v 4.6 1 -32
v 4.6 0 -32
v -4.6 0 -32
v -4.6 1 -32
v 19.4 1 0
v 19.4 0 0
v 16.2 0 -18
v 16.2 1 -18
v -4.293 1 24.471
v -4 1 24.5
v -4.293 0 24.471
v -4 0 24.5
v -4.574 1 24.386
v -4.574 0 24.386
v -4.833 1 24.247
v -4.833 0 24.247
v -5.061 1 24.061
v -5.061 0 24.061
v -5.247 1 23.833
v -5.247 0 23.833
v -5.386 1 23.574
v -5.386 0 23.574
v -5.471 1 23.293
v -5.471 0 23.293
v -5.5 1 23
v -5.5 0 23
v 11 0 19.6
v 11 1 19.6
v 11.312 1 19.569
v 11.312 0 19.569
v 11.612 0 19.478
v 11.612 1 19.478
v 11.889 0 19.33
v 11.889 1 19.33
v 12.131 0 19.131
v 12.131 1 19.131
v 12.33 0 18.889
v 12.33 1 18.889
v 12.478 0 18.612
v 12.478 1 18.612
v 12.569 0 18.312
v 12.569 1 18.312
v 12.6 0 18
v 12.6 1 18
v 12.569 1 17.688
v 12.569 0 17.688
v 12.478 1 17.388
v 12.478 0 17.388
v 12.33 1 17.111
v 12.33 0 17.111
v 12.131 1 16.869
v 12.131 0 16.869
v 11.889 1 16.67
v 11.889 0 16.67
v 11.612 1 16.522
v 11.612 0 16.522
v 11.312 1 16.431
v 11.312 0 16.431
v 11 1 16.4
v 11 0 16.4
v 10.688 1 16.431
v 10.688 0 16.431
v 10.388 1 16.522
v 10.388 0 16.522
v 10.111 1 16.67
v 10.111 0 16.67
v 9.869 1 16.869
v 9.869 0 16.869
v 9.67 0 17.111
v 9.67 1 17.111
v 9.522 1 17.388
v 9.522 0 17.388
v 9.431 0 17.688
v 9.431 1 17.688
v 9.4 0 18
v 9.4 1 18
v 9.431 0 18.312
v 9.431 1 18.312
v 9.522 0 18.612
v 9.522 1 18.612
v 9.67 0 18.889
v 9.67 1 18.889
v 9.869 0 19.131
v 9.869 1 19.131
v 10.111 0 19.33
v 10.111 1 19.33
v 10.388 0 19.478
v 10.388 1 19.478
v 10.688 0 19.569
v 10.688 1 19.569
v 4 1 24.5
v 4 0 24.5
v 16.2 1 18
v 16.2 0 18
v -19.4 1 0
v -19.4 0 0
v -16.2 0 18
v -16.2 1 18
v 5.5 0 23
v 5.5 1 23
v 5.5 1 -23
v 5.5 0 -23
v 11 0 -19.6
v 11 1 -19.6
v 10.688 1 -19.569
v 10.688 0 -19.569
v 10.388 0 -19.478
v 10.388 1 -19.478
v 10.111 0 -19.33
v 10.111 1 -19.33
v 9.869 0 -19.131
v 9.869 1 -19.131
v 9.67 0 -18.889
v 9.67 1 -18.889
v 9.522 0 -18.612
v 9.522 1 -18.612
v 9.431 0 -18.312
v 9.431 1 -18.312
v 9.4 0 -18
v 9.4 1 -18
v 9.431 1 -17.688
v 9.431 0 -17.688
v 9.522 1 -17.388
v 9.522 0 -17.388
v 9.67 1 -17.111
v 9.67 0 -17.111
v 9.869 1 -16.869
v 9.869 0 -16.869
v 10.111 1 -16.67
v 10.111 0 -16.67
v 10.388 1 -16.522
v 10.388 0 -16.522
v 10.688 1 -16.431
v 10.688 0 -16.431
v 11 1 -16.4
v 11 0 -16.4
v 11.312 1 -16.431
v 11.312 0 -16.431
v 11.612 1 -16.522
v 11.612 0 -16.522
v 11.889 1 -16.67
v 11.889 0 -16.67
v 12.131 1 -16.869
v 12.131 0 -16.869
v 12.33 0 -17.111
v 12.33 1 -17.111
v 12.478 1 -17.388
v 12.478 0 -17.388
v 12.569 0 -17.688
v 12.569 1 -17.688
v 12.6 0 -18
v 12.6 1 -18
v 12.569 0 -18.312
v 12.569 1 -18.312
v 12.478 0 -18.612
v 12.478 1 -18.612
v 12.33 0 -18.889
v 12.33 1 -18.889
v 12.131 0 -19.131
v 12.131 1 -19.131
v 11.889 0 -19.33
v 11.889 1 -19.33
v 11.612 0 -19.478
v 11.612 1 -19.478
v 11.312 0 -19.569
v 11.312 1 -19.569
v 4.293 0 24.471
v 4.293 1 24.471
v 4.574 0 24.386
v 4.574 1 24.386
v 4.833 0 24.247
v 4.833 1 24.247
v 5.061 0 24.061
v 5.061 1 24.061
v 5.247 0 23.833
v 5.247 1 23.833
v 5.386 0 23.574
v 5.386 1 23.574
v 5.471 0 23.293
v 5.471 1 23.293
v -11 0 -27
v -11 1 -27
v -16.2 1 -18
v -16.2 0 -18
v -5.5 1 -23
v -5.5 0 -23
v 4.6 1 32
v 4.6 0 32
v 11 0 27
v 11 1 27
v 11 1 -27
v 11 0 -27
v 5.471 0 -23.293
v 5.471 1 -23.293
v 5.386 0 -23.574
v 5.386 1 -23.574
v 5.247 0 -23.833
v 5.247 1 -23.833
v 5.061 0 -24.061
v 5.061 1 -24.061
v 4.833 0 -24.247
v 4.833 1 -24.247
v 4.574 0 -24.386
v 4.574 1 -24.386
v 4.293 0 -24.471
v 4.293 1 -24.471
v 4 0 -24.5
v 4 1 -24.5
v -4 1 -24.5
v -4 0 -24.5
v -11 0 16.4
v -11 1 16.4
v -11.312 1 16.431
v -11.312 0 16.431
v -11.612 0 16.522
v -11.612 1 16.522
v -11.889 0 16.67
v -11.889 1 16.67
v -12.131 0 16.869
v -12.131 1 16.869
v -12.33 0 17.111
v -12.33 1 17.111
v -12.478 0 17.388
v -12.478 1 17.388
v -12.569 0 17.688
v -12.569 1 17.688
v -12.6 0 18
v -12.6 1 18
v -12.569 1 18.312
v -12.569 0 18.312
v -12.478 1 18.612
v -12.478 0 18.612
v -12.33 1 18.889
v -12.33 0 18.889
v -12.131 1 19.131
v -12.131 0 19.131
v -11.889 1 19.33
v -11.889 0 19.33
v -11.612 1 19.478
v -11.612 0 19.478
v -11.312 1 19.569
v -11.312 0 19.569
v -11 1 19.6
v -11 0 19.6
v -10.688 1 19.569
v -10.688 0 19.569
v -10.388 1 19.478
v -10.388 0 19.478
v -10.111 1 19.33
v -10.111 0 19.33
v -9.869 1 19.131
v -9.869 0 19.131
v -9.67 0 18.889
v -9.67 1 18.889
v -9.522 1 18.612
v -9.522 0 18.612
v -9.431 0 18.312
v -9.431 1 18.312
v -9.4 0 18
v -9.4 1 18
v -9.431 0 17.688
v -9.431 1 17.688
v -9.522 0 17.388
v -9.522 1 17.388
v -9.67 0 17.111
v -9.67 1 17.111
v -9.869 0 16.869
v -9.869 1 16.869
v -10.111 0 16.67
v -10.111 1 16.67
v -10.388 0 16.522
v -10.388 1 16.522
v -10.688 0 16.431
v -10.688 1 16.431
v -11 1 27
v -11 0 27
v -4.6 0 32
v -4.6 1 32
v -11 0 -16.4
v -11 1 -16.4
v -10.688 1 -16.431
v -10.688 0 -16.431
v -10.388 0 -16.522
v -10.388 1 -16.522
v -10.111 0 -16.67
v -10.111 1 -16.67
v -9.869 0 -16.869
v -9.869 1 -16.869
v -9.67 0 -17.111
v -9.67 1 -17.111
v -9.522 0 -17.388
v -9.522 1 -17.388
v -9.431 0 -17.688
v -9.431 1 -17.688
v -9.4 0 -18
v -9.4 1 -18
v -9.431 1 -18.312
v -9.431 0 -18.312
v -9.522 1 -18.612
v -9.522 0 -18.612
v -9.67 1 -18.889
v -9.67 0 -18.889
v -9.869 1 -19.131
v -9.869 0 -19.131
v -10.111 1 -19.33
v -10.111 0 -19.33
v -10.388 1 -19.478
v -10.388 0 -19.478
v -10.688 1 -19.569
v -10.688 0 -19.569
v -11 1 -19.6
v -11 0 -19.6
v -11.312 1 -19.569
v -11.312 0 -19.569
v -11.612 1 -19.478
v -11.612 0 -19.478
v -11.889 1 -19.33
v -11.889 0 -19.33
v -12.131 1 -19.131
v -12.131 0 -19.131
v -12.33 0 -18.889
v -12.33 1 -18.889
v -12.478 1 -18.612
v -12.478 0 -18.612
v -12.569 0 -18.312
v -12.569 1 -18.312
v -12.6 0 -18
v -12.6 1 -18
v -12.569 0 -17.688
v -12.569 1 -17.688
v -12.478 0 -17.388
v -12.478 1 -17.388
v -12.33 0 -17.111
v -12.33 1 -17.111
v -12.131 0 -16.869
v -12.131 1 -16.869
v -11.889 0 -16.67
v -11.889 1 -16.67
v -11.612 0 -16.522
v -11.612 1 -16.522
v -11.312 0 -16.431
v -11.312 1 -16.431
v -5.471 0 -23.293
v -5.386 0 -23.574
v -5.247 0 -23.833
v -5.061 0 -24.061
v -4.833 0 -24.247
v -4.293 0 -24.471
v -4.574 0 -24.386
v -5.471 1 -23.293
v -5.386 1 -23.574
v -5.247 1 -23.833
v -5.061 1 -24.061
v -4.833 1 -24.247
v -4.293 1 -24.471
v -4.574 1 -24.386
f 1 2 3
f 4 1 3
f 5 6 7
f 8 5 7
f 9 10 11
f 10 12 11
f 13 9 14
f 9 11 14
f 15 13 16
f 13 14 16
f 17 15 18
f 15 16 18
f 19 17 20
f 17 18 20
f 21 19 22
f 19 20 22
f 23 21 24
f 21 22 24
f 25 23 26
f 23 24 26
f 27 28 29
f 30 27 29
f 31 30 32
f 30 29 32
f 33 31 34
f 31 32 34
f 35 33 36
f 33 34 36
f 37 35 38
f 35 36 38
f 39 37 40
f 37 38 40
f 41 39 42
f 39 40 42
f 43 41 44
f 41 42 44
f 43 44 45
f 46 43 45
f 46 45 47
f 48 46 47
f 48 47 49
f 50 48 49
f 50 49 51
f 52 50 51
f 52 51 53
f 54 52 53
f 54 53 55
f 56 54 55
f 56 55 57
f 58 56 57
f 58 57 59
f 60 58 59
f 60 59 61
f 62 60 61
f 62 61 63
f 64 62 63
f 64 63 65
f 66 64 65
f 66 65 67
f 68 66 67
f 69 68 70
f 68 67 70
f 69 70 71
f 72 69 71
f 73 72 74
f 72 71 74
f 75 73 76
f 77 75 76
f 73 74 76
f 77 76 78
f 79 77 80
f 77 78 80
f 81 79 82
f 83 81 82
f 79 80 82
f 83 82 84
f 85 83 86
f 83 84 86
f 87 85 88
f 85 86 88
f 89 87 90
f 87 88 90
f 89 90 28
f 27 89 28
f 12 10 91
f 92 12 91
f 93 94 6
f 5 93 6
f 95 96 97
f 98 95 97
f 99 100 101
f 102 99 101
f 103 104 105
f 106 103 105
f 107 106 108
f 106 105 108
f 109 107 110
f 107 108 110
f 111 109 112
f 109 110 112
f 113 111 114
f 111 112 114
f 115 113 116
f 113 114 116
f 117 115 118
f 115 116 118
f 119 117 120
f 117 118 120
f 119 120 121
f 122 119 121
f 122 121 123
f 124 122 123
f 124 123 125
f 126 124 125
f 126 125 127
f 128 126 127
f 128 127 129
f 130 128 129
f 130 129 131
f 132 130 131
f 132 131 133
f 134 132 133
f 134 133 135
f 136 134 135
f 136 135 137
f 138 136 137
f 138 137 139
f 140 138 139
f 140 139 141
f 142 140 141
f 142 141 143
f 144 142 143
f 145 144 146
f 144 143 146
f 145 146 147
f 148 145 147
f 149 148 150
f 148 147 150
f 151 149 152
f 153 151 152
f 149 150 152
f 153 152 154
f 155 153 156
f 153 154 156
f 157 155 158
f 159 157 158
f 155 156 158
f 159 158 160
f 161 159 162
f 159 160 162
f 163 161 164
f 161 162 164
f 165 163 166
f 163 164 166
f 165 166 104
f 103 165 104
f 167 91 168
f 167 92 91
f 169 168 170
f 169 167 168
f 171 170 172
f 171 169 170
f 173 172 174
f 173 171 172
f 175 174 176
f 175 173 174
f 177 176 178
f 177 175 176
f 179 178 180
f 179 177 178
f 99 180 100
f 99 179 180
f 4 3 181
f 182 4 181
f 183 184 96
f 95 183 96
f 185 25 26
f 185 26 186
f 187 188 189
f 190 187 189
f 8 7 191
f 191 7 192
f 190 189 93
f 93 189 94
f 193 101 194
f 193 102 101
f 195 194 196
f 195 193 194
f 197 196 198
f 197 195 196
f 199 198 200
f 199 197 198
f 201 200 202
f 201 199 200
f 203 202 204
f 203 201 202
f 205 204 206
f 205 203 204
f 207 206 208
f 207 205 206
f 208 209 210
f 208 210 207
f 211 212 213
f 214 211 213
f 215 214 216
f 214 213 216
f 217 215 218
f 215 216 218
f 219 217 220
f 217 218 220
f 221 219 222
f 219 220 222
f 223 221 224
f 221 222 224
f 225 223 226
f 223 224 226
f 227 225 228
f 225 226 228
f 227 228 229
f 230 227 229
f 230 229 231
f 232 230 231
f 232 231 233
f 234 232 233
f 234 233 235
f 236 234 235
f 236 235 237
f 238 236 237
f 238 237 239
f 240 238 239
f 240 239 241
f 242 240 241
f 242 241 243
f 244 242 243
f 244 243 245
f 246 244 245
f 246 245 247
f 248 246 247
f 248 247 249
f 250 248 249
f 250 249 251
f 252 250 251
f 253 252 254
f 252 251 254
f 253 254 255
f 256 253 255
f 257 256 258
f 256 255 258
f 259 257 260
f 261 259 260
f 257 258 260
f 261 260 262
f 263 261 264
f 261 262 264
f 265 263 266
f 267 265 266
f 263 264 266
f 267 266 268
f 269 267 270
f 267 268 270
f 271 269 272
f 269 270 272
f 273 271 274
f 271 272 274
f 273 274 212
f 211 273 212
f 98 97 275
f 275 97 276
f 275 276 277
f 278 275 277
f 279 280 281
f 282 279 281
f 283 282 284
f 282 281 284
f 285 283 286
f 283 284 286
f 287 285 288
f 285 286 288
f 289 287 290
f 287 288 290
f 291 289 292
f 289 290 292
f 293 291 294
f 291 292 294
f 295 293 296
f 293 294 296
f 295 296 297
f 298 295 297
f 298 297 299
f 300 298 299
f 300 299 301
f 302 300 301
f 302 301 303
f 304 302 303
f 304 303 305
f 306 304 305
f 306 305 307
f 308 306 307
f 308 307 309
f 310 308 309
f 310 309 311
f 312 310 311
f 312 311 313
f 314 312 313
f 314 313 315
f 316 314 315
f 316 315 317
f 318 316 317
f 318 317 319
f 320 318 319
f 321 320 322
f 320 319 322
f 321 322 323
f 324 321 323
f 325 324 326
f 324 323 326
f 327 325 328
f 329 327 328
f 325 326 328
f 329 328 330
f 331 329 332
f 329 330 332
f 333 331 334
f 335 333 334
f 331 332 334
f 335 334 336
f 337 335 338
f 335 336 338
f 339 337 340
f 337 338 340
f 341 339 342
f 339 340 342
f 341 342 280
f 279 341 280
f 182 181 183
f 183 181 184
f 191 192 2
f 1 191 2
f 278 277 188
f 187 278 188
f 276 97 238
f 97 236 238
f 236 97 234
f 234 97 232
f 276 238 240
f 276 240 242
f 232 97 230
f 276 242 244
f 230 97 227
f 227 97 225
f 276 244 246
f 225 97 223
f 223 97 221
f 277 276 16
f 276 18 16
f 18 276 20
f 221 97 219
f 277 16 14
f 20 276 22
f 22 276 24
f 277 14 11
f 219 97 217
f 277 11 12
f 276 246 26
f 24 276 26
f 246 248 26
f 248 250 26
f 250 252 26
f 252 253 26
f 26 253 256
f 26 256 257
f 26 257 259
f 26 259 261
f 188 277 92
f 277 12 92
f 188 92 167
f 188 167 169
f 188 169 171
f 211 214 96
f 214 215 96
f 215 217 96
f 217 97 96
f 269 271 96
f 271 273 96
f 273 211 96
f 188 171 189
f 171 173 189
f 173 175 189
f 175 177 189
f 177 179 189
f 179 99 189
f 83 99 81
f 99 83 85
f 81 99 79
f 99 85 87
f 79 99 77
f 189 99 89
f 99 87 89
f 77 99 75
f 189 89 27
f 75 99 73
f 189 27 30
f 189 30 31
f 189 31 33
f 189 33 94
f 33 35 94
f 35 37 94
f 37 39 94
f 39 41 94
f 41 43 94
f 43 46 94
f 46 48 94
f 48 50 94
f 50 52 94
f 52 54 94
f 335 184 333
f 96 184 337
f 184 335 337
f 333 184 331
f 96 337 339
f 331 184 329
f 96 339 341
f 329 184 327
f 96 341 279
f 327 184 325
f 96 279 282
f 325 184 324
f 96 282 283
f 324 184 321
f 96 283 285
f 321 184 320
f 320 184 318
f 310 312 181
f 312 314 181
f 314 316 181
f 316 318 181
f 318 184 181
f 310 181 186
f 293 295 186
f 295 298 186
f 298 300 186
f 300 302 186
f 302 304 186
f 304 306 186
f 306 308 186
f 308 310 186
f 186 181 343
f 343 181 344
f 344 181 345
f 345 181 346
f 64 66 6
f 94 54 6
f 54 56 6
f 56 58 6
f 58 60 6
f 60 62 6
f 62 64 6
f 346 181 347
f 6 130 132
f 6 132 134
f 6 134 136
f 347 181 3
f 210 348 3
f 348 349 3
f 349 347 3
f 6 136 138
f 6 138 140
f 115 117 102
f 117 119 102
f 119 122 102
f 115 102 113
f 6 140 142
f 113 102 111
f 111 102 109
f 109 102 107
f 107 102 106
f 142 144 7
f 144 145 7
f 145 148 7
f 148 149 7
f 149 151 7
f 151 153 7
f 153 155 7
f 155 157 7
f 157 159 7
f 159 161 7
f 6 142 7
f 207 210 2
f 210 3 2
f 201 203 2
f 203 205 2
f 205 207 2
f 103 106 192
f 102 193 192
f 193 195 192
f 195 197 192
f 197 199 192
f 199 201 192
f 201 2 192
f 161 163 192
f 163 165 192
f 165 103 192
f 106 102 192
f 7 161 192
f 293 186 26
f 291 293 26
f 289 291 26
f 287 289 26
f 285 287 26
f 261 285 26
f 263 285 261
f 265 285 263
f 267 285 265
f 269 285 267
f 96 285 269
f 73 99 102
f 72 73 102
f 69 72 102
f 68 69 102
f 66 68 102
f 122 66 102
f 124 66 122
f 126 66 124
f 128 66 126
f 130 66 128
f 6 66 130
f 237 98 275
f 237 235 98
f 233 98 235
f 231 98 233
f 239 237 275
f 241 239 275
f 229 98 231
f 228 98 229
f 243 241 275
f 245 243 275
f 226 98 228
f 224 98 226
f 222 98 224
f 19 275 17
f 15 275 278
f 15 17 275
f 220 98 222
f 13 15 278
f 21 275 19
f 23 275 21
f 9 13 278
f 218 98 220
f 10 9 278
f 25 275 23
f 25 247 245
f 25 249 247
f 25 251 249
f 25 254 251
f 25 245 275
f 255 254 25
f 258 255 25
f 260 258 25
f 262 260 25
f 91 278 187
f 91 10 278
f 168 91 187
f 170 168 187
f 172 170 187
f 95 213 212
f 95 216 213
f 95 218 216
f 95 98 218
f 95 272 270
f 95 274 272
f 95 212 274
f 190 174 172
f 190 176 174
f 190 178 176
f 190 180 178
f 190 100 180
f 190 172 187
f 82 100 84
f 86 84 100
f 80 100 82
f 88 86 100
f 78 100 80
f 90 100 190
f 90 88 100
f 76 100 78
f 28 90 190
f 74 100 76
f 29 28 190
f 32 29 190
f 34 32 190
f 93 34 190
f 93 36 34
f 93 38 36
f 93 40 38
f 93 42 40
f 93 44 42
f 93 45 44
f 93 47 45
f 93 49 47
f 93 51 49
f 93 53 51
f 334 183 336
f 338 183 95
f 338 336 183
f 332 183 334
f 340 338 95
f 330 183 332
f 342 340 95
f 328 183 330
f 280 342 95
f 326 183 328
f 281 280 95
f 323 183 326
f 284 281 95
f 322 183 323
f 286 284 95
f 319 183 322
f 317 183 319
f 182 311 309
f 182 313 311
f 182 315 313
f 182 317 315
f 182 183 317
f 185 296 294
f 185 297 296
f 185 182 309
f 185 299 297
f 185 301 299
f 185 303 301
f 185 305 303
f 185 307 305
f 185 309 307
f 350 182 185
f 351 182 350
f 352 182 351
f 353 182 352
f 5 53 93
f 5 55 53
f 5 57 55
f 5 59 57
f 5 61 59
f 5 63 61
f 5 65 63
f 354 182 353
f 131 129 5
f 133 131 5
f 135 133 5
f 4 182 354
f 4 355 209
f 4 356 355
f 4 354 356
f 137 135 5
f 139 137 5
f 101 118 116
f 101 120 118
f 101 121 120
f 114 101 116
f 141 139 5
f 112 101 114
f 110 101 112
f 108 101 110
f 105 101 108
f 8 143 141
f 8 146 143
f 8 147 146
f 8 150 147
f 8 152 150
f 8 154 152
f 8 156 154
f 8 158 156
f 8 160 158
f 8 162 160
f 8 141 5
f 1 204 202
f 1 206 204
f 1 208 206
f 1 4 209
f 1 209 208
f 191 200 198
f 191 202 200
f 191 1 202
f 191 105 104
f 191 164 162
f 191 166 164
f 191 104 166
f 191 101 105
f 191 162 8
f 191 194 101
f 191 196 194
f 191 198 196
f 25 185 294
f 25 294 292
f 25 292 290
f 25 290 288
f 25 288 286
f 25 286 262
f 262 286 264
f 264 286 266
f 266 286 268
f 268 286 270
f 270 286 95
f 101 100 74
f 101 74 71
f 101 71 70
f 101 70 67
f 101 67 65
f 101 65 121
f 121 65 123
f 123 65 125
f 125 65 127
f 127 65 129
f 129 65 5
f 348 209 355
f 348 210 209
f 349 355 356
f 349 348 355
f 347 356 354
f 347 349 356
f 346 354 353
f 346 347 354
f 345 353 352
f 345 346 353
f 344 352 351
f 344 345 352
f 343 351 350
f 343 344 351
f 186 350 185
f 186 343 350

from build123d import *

# Parameters (mm, degrees)
BOSS_EXTRUDE1_DEPTH = 1
SKETCH2_W           = 11
SKETCH2_H           = 49
CUT_EXTRUDE1_DEPTH  = 38.434743221
FILLET1_R           = 1.5
SKETCH3_R           = 1.6
CUT_EXTRUDE2_DEPTH  = 38.434743221


with BuildPart() as part:
    # Sketch1 → Boss-Extrude1 (new body)
    with BuildSketch(Plane(origin=(0, 0, 0), x_dir=(1, 0, 0), z_dir=(0, 1, 0))):
        Polygon((19.4, 0), (16.2, 18), (11, 27), (4.6, 32), (-4.6, 32), (-11, 27), (-16.2, 18), (-19.4, 0), (-16.2, -18), (-11, -27), (-4.6, -32), (4.6, -32), (11, -27), (16.2, -18), align=None)
    extrude(amount=BOSS_EXTRUDE1_DEPTH)

    # Sketch2 → Cut-Extrude1 (cut, through all)
    with BuildSketch(Plane(origin=(0, 1, 0), x_dir=(1, 0, 0), z_dir=(0, 1, 0))):
        Rectangle(SKETCH2_W, SKETCH2_H)
    extrude(amount=-CUT_EXTRUDE1_DEPTH, mode=Mode.SUBTRACT)

    # Fillet1
    fillet1_edges = [part.edges().sort_by_distance(p)[0] for p in [
        (5.5, 0.5, -24.5),
        (5.5, 0.5, 24.5),
        (-5.5, 0.5, 24.5),
        (-5.5, 0.5, -24.5),
    ]]
    fillet(fillet1_edges, radius=FILLET1_R)

    # Sketch3 → Cut-Extrude2 (cut, through all)
    with BuildSketch(Plane(origin=(0, 1, 0), x_dir=(1, 0, 0), z_dir=(0, 1, 0))):
        with Locations(Location((-11, 18, 0), (0, 0, 270))):
            Circle(SKETCH3_R)
        with Locations(Location((11, 18, 0), (0, 0, 90))):
            Circle(SKETCH3_R)
        with Locations(Location((-11, -18, 0), (0, 0, 90))):
            Circle(SKETCH3_R)
        with Locations(Location((11, -18, 0), (0, 0, 270))):
            Circle(SKETCH3_R)
    extrude(amount=-CUT_EXTRUDE2_DEPTH, mode=Mode.SUBTRACT)


solid = part.part
